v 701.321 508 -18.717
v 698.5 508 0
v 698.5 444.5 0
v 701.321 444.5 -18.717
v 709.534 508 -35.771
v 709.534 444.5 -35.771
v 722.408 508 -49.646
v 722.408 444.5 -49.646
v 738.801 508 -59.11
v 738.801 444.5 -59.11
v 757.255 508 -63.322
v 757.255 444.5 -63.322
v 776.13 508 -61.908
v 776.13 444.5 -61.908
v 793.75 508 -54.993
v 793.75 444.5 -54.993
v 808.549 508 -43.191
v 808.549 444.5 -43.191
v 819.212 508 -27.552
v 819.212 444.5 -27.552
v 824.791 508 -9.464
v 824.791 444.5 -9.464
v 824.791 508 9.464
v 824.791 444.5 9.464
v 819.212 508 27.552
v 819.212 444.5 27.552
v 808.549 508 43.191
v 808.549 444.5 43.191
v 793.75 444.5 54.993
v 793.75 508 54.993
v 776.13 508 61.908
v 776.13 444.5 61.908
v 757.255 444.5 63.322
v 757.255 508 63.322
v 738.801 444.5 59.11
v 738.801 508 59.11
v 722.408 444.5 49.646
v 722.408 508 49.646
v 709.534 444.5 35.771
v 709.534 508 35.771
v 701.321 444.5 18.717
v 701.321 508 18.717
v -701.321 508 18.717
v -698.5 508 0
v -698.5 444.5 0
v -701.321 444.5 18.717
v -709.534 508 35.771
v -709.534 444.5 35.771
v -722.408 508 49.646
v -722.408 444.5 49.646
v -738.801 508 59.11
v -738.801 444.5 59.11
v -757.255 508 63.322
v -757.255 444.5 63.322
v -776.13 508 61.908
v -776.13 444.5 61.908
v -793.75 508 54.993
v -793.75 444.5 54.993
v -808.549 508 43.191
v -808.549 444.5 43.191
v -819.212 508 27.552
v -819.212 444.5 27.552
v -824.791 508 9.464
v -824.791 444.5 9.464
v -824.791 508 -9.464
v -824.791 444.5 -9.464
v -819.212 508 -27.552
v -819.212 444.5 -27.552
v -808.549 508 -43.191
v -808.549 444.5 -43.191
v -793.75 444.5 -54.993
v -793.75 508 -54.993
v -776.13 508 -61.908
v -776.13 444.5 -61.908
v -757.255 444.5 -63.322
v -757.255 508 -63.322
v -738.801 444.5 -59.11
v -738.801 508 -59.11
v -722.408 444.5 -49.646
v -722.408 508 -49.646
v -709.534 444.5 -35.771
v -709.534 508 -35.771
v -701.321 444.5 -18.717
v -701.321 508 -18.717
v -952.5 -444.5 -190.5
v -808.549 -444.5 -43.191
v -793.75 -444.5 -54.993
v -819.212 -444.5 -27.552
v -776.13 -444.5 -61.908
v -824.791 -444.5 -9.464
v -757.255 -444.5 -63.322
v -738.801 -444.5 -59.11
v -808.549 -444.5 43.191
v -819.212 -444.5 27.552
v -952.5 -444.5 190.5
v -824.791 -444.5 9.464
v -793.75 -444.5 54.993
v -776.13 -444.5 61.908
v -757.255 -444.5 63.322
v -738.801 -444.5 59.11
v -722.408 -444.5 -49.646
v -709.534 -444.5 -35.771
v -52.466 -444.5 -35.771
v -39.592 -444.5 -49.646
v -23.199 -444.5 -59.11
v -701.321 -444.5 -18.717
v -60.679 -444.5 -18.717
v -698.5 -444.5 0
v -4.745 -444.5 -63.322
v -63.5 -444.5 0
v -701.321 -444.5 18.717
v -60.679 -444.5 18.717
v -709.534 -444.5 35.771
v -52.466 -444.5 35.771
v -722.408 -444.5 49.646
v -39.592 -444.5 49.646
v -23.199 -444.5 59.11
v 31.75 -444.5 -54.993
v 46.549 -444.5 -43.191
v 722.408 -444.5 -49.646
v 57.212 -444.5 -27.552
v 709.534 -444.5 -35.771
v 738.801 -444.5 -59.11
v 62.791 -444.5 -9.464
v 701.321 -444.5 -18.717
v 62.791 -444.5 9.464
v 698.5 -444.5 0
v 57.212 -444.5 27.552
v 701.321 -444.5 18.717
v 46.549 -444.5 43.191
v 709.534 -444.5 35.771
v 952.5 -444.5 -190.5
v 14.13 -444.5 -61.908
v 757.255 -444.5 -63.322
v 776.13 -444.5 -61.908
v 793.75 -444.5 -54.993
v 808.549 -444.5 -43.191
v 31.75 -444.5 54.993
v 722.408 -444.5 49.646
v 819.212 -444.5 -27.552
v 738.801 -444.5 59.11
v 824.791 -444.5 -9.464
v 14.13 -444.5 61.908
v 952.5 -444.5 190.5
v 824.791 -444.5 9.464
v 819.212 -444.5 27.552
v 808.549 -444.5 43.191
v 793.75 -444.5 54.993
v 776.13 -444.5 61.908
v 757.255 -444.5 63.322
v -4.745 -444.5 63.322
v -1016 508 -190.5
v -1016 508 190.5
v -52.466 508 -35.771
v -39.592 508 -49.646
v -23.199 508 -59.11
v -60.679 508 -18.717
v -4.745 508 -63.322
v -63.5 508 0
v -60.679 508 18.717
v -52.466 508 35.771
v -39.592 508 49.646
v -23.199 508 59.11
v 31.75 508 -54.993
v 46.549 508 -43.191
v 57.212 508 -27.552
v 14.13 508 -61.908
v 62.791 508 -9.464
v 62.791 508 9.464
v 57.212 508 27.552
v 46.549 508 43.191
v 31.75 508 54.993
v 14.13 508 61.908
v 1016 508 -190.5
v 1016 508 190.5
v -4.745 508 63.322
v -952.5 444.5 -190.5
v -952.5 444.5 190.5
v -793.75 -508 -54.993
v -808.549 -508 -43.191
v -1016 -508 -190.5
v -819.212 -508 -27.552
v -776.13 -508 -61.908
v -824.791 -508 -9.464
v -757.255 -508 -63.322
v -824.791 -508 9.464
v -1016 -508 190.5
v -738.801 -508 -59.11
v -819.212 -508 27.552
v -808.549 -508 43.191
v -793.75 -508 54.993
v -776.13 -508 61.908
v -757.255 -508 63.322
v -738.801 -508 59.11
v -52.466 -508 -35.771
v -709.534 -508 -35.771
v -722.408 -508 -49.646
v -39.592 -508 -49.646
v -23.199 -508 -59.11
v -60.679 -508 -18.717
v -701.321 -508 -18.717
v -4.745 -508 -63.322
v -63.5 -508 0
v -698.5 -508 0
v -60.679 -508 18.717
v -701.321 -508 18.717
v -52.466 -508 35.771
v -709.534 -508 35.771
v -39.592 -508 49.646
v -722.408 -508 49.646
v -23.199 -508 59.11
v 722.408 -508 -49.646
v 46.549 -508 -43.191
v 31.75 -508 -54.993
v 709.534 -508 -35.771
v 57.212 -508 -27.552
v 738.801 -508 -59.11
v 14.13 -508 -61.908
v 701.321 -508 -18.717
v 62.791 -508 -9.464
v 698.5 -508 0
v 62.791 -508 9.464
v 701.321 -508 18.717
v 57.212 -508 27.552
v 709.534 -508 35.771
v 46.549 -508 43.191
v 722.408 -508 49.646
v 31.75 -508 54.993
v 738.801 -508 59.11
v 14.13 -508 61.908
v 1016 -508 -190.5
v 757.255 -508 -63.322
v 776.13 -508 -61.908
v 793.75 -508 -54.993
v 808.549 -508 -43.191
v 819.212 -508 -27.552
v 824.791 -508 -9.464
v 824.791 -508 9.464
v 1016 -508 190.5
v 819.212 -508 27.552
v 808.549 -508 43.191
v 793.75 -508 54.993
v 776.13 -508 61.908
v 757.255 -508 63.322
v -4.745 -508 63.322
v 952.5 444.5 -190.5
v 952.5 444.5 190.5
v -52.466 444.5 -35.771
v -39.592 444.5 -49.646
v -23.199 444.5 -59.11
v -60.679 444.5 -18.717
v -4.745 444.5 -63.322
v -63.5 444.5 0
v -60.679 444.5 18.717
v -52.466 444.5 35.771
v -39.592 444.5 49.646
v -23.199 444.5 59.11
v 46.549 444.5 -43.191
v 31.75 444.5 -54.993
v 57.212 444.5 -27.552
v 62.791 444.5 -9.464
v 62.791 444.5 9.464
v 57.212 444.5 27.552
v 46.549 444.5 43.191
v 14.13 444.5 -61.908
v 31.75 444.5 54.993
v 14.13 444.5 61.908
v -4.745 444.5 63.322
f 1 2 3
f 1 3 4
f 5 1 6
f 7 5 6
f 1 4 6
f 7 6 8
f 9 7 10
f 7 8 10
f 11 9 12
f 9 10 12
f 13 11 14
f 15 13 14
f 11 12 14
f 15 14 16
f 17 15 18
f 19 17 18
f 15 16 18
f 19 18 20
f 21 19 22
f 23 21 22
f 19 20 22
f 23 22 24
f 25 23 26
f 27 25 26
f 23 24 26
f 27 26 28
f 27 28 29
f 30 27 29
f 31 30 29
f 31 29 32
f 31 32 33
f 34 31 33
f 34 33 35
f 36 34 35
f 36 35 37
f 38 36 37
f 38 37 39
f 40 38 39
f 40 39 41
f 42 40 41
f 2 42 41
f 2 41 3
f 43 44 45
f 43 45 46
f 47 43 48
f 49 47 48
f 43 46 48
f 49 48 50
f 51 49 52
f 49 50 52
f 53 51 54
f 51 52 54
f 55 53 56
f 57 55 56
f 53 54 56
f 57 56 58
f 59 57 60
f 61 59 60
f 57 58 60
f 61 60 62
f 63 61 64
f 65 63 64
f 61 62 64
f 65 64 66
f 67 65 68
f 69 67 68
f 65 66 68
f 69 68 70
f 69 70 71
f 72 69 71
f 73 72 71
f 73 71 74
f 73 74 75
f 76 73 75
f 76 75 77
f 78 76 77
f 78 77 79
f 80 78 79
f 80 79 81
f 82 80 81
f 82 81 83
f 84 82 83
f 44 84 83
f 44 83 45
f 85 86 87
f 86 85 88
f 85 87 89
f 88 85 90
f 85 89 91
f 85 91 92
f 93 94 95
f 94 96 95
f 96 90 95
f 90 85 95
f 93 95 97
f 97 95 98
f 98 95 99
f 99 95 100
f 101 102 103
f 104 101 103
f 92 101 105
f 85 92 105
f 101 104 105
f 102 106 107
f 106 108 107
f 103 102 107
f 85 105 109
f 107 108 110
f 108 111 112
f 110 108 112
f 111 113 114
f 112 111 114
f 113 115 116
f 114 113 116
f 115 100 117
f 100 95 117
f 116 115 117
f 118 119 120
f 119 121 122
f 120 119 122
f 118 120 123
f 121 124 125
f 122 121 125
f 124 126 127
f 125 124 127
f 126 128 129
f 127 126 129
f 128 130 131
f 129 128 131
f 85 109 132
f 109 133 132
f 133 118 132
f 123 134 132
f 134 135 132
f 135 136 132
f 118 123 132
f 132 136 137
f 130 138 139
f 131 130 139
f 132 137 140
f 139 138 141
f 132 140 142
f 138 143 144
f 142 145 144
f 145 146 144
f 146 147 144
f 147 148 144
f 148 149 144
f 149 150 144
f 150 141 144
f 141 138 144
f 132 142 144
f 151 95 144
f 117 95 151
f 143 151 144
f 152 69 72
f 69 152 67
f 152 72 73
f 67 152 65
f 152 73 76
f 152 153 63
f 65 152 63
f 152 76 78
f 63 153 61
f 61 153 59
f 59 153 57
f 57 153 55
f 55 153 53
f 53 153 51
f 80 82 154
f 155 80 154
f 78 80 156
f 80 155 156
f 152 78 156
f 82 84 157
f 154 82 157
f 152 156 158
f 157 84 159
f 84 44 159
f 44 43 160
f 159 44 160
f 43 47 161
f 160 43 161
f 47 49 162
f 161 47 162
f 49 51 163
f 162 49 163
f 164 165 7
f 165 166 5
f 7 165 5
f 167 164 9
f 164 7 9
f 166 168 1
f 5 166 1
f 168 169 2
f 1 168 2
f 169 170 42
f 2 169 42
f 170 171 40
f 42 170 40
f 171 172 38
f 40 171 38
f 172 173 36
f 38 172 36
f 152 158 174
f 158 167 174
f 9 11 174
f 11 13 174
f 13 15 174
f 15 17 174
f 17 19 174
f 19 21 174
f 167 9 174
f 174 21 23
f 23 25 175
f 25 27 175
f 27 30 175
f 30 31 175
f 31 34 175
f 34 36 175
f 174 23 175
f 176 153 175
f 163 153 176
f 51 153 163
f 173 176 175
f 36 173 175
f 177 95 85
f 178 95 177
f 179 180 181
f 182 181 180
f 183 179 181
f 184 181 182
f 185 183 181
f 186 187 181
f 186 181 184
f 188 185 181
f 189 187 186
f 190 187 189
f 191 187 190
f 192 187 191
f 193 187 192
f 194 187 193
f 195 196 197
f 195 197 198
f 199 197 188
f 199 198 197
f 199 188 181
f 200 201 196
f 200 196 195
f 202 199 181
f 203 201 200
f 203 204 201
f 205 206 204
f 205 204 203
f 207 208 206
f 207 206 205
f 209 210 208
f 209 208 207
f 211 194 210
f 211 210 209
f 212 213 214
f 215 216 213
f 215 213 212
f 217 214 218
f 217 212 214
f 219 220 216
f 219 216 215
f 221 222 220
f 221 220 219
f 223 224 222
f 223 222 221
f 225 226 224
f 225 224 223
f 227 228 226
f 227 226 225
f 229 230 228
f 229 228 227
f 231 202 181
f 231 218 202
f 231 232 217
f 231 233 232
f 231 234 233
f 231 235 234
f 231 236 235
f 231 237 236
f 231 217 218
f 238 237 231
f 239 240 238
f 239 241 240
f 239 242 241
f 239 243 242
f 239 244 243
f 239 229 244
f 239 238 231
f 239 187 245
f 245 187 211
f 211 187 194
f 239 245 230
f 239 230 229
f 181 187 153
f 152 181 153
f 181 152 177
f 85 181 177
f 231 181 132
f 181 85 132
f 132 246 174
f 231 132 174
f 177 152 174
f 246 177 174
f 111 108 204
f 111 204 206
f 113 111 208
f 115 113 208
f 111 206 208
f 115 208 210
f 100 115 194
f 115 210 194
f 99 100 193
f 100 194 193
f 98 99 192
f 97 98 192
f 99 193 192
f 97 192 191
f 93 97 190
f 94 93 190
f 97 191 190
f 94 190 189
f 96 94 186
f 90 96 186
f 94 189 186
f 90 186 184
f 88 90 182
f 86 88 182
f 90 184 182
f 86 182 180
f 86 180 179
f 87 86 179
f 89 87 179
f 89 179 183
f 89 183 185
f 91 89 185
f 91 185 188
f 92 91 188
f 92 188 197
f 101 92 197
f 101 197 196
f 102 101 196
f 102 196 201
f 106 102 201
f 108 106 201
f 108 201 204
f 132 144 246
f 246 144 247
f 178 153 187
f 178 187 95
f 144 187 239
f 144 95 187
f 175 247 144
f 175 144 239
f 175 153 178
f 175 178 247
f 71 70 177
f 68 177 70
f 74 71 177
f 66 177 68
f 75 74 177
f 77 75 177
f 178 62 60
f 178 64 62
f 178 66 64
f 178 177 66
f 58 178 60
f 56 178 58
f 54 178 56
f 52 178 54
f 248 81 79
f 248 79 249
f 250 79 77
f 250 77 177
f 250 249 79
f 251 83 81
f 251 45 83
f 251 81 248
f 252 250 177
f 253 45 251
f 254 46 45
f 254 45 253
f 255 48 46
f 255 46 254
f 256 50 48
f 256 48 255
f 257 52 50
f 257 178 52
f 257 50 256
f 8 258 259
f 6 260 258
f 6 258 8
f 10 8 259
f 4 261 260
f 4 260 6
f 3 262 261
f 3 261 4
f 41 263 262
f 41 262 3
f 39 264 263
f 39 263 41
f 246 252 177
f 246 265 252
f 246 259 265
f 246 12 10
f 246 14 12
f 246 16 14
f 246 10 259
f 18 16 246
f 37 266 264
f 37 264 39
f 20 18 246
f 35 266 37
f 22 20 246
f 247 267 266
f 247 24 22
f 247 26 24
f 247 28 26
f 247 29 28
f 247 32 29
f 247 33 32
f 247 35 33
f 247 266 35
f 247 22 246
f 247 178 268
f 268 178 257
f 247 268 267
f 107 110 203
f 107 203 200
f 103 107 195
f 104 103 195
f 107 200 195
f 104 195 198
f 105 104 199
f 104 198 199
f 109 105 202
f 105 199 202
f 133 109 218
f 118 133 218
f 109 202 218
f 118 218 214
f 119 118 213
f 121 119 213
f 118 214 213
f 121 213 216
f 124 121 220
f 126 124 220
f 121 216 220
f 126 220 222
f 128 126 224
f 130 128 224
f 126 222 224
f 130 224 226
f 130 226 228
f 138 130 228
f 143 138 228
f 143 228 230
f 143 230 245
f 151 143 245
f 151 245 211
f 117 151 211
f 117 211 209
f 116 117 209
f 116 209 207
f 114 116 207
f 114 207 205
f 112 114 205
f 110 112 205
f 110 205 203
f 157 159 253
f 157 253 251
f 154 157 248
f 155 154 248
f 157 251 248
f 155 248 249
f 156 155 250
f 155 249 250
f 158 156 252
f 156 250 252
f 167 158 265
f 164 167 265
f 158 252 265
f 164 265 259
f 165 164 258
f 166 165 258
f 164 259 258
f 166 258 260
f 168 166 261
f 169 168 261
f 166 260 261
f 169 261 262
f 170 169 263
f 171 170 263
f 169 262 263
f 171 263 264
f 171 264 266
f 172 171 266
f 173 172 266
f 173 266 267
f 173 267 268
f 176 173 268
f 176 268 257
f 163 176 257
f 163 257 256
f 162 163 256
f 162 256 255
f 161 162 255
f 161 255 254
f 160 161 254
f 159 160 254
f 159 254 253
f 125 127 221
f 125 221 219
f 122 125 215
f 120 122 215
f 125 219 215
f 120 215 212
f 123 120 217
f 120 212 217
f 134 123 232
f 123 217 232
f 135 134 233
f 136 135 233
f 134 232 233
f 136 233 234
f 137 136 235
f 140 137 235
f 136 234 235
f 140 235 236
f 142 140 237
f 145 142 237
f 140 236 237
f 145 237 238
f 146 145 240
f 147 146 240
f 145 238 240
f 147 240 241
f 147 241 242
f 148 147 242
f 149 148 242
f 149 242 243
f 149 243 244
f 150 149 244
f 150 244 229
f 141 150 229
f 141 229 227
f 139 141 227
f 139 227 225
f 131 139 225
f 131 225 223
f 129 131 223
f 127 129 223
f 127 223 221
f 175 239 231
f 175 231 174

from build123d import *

# Parameters (mm, degrees)
F0_W     = 2032
F0_H     = 1016
F0_W_2   = 1905
F0_H_2   = 889
F1_DEPTH = 190.5
F2_R     = 63.5
F3_DEPTH = 1016.001


with BuildPart() as f1:
    # F0 (on Top) → F1 (new body, symmetric)
    with BuildSketch(Plane.XY):
        Rectangle(F0_W, F0_H)
        Rectangle(F0_W_2, F0_H_2, mode=Mode.SUBTRACT)
    extrude(amount=F1_DEPTH, both=True)

    # F2 (on face) → F3 (cut, through all)
    with BuildSketch(Plane.XZ.offset(508)):
        with BuildLine():
            ThreePointArc((825.5, 0), (762, 63.5), (698.5, 0))
            ThreePointArc((698.5, 0), (762, -63.5), (825.5, 0))
        make_face()
        with BuildLine():
            ThreePointArc((63.5, 0), (0, 63.5), (-63.5, 0))
            Line((-63.5, 0), (63.5, 0))
        make_face()
        with BuildLine():
            Line((63.5, 0), (-63.5, 0))
            ThreePointArc((-63.5, 0), (0, -63.5), (63.5, 0))
        make_face()
        with Locations((-762, 0)):
            Circle(F2_R)
    extrude(amount=-F3_DEPTH, mode=Mode.SUBTRACT)


solid = f1.part
